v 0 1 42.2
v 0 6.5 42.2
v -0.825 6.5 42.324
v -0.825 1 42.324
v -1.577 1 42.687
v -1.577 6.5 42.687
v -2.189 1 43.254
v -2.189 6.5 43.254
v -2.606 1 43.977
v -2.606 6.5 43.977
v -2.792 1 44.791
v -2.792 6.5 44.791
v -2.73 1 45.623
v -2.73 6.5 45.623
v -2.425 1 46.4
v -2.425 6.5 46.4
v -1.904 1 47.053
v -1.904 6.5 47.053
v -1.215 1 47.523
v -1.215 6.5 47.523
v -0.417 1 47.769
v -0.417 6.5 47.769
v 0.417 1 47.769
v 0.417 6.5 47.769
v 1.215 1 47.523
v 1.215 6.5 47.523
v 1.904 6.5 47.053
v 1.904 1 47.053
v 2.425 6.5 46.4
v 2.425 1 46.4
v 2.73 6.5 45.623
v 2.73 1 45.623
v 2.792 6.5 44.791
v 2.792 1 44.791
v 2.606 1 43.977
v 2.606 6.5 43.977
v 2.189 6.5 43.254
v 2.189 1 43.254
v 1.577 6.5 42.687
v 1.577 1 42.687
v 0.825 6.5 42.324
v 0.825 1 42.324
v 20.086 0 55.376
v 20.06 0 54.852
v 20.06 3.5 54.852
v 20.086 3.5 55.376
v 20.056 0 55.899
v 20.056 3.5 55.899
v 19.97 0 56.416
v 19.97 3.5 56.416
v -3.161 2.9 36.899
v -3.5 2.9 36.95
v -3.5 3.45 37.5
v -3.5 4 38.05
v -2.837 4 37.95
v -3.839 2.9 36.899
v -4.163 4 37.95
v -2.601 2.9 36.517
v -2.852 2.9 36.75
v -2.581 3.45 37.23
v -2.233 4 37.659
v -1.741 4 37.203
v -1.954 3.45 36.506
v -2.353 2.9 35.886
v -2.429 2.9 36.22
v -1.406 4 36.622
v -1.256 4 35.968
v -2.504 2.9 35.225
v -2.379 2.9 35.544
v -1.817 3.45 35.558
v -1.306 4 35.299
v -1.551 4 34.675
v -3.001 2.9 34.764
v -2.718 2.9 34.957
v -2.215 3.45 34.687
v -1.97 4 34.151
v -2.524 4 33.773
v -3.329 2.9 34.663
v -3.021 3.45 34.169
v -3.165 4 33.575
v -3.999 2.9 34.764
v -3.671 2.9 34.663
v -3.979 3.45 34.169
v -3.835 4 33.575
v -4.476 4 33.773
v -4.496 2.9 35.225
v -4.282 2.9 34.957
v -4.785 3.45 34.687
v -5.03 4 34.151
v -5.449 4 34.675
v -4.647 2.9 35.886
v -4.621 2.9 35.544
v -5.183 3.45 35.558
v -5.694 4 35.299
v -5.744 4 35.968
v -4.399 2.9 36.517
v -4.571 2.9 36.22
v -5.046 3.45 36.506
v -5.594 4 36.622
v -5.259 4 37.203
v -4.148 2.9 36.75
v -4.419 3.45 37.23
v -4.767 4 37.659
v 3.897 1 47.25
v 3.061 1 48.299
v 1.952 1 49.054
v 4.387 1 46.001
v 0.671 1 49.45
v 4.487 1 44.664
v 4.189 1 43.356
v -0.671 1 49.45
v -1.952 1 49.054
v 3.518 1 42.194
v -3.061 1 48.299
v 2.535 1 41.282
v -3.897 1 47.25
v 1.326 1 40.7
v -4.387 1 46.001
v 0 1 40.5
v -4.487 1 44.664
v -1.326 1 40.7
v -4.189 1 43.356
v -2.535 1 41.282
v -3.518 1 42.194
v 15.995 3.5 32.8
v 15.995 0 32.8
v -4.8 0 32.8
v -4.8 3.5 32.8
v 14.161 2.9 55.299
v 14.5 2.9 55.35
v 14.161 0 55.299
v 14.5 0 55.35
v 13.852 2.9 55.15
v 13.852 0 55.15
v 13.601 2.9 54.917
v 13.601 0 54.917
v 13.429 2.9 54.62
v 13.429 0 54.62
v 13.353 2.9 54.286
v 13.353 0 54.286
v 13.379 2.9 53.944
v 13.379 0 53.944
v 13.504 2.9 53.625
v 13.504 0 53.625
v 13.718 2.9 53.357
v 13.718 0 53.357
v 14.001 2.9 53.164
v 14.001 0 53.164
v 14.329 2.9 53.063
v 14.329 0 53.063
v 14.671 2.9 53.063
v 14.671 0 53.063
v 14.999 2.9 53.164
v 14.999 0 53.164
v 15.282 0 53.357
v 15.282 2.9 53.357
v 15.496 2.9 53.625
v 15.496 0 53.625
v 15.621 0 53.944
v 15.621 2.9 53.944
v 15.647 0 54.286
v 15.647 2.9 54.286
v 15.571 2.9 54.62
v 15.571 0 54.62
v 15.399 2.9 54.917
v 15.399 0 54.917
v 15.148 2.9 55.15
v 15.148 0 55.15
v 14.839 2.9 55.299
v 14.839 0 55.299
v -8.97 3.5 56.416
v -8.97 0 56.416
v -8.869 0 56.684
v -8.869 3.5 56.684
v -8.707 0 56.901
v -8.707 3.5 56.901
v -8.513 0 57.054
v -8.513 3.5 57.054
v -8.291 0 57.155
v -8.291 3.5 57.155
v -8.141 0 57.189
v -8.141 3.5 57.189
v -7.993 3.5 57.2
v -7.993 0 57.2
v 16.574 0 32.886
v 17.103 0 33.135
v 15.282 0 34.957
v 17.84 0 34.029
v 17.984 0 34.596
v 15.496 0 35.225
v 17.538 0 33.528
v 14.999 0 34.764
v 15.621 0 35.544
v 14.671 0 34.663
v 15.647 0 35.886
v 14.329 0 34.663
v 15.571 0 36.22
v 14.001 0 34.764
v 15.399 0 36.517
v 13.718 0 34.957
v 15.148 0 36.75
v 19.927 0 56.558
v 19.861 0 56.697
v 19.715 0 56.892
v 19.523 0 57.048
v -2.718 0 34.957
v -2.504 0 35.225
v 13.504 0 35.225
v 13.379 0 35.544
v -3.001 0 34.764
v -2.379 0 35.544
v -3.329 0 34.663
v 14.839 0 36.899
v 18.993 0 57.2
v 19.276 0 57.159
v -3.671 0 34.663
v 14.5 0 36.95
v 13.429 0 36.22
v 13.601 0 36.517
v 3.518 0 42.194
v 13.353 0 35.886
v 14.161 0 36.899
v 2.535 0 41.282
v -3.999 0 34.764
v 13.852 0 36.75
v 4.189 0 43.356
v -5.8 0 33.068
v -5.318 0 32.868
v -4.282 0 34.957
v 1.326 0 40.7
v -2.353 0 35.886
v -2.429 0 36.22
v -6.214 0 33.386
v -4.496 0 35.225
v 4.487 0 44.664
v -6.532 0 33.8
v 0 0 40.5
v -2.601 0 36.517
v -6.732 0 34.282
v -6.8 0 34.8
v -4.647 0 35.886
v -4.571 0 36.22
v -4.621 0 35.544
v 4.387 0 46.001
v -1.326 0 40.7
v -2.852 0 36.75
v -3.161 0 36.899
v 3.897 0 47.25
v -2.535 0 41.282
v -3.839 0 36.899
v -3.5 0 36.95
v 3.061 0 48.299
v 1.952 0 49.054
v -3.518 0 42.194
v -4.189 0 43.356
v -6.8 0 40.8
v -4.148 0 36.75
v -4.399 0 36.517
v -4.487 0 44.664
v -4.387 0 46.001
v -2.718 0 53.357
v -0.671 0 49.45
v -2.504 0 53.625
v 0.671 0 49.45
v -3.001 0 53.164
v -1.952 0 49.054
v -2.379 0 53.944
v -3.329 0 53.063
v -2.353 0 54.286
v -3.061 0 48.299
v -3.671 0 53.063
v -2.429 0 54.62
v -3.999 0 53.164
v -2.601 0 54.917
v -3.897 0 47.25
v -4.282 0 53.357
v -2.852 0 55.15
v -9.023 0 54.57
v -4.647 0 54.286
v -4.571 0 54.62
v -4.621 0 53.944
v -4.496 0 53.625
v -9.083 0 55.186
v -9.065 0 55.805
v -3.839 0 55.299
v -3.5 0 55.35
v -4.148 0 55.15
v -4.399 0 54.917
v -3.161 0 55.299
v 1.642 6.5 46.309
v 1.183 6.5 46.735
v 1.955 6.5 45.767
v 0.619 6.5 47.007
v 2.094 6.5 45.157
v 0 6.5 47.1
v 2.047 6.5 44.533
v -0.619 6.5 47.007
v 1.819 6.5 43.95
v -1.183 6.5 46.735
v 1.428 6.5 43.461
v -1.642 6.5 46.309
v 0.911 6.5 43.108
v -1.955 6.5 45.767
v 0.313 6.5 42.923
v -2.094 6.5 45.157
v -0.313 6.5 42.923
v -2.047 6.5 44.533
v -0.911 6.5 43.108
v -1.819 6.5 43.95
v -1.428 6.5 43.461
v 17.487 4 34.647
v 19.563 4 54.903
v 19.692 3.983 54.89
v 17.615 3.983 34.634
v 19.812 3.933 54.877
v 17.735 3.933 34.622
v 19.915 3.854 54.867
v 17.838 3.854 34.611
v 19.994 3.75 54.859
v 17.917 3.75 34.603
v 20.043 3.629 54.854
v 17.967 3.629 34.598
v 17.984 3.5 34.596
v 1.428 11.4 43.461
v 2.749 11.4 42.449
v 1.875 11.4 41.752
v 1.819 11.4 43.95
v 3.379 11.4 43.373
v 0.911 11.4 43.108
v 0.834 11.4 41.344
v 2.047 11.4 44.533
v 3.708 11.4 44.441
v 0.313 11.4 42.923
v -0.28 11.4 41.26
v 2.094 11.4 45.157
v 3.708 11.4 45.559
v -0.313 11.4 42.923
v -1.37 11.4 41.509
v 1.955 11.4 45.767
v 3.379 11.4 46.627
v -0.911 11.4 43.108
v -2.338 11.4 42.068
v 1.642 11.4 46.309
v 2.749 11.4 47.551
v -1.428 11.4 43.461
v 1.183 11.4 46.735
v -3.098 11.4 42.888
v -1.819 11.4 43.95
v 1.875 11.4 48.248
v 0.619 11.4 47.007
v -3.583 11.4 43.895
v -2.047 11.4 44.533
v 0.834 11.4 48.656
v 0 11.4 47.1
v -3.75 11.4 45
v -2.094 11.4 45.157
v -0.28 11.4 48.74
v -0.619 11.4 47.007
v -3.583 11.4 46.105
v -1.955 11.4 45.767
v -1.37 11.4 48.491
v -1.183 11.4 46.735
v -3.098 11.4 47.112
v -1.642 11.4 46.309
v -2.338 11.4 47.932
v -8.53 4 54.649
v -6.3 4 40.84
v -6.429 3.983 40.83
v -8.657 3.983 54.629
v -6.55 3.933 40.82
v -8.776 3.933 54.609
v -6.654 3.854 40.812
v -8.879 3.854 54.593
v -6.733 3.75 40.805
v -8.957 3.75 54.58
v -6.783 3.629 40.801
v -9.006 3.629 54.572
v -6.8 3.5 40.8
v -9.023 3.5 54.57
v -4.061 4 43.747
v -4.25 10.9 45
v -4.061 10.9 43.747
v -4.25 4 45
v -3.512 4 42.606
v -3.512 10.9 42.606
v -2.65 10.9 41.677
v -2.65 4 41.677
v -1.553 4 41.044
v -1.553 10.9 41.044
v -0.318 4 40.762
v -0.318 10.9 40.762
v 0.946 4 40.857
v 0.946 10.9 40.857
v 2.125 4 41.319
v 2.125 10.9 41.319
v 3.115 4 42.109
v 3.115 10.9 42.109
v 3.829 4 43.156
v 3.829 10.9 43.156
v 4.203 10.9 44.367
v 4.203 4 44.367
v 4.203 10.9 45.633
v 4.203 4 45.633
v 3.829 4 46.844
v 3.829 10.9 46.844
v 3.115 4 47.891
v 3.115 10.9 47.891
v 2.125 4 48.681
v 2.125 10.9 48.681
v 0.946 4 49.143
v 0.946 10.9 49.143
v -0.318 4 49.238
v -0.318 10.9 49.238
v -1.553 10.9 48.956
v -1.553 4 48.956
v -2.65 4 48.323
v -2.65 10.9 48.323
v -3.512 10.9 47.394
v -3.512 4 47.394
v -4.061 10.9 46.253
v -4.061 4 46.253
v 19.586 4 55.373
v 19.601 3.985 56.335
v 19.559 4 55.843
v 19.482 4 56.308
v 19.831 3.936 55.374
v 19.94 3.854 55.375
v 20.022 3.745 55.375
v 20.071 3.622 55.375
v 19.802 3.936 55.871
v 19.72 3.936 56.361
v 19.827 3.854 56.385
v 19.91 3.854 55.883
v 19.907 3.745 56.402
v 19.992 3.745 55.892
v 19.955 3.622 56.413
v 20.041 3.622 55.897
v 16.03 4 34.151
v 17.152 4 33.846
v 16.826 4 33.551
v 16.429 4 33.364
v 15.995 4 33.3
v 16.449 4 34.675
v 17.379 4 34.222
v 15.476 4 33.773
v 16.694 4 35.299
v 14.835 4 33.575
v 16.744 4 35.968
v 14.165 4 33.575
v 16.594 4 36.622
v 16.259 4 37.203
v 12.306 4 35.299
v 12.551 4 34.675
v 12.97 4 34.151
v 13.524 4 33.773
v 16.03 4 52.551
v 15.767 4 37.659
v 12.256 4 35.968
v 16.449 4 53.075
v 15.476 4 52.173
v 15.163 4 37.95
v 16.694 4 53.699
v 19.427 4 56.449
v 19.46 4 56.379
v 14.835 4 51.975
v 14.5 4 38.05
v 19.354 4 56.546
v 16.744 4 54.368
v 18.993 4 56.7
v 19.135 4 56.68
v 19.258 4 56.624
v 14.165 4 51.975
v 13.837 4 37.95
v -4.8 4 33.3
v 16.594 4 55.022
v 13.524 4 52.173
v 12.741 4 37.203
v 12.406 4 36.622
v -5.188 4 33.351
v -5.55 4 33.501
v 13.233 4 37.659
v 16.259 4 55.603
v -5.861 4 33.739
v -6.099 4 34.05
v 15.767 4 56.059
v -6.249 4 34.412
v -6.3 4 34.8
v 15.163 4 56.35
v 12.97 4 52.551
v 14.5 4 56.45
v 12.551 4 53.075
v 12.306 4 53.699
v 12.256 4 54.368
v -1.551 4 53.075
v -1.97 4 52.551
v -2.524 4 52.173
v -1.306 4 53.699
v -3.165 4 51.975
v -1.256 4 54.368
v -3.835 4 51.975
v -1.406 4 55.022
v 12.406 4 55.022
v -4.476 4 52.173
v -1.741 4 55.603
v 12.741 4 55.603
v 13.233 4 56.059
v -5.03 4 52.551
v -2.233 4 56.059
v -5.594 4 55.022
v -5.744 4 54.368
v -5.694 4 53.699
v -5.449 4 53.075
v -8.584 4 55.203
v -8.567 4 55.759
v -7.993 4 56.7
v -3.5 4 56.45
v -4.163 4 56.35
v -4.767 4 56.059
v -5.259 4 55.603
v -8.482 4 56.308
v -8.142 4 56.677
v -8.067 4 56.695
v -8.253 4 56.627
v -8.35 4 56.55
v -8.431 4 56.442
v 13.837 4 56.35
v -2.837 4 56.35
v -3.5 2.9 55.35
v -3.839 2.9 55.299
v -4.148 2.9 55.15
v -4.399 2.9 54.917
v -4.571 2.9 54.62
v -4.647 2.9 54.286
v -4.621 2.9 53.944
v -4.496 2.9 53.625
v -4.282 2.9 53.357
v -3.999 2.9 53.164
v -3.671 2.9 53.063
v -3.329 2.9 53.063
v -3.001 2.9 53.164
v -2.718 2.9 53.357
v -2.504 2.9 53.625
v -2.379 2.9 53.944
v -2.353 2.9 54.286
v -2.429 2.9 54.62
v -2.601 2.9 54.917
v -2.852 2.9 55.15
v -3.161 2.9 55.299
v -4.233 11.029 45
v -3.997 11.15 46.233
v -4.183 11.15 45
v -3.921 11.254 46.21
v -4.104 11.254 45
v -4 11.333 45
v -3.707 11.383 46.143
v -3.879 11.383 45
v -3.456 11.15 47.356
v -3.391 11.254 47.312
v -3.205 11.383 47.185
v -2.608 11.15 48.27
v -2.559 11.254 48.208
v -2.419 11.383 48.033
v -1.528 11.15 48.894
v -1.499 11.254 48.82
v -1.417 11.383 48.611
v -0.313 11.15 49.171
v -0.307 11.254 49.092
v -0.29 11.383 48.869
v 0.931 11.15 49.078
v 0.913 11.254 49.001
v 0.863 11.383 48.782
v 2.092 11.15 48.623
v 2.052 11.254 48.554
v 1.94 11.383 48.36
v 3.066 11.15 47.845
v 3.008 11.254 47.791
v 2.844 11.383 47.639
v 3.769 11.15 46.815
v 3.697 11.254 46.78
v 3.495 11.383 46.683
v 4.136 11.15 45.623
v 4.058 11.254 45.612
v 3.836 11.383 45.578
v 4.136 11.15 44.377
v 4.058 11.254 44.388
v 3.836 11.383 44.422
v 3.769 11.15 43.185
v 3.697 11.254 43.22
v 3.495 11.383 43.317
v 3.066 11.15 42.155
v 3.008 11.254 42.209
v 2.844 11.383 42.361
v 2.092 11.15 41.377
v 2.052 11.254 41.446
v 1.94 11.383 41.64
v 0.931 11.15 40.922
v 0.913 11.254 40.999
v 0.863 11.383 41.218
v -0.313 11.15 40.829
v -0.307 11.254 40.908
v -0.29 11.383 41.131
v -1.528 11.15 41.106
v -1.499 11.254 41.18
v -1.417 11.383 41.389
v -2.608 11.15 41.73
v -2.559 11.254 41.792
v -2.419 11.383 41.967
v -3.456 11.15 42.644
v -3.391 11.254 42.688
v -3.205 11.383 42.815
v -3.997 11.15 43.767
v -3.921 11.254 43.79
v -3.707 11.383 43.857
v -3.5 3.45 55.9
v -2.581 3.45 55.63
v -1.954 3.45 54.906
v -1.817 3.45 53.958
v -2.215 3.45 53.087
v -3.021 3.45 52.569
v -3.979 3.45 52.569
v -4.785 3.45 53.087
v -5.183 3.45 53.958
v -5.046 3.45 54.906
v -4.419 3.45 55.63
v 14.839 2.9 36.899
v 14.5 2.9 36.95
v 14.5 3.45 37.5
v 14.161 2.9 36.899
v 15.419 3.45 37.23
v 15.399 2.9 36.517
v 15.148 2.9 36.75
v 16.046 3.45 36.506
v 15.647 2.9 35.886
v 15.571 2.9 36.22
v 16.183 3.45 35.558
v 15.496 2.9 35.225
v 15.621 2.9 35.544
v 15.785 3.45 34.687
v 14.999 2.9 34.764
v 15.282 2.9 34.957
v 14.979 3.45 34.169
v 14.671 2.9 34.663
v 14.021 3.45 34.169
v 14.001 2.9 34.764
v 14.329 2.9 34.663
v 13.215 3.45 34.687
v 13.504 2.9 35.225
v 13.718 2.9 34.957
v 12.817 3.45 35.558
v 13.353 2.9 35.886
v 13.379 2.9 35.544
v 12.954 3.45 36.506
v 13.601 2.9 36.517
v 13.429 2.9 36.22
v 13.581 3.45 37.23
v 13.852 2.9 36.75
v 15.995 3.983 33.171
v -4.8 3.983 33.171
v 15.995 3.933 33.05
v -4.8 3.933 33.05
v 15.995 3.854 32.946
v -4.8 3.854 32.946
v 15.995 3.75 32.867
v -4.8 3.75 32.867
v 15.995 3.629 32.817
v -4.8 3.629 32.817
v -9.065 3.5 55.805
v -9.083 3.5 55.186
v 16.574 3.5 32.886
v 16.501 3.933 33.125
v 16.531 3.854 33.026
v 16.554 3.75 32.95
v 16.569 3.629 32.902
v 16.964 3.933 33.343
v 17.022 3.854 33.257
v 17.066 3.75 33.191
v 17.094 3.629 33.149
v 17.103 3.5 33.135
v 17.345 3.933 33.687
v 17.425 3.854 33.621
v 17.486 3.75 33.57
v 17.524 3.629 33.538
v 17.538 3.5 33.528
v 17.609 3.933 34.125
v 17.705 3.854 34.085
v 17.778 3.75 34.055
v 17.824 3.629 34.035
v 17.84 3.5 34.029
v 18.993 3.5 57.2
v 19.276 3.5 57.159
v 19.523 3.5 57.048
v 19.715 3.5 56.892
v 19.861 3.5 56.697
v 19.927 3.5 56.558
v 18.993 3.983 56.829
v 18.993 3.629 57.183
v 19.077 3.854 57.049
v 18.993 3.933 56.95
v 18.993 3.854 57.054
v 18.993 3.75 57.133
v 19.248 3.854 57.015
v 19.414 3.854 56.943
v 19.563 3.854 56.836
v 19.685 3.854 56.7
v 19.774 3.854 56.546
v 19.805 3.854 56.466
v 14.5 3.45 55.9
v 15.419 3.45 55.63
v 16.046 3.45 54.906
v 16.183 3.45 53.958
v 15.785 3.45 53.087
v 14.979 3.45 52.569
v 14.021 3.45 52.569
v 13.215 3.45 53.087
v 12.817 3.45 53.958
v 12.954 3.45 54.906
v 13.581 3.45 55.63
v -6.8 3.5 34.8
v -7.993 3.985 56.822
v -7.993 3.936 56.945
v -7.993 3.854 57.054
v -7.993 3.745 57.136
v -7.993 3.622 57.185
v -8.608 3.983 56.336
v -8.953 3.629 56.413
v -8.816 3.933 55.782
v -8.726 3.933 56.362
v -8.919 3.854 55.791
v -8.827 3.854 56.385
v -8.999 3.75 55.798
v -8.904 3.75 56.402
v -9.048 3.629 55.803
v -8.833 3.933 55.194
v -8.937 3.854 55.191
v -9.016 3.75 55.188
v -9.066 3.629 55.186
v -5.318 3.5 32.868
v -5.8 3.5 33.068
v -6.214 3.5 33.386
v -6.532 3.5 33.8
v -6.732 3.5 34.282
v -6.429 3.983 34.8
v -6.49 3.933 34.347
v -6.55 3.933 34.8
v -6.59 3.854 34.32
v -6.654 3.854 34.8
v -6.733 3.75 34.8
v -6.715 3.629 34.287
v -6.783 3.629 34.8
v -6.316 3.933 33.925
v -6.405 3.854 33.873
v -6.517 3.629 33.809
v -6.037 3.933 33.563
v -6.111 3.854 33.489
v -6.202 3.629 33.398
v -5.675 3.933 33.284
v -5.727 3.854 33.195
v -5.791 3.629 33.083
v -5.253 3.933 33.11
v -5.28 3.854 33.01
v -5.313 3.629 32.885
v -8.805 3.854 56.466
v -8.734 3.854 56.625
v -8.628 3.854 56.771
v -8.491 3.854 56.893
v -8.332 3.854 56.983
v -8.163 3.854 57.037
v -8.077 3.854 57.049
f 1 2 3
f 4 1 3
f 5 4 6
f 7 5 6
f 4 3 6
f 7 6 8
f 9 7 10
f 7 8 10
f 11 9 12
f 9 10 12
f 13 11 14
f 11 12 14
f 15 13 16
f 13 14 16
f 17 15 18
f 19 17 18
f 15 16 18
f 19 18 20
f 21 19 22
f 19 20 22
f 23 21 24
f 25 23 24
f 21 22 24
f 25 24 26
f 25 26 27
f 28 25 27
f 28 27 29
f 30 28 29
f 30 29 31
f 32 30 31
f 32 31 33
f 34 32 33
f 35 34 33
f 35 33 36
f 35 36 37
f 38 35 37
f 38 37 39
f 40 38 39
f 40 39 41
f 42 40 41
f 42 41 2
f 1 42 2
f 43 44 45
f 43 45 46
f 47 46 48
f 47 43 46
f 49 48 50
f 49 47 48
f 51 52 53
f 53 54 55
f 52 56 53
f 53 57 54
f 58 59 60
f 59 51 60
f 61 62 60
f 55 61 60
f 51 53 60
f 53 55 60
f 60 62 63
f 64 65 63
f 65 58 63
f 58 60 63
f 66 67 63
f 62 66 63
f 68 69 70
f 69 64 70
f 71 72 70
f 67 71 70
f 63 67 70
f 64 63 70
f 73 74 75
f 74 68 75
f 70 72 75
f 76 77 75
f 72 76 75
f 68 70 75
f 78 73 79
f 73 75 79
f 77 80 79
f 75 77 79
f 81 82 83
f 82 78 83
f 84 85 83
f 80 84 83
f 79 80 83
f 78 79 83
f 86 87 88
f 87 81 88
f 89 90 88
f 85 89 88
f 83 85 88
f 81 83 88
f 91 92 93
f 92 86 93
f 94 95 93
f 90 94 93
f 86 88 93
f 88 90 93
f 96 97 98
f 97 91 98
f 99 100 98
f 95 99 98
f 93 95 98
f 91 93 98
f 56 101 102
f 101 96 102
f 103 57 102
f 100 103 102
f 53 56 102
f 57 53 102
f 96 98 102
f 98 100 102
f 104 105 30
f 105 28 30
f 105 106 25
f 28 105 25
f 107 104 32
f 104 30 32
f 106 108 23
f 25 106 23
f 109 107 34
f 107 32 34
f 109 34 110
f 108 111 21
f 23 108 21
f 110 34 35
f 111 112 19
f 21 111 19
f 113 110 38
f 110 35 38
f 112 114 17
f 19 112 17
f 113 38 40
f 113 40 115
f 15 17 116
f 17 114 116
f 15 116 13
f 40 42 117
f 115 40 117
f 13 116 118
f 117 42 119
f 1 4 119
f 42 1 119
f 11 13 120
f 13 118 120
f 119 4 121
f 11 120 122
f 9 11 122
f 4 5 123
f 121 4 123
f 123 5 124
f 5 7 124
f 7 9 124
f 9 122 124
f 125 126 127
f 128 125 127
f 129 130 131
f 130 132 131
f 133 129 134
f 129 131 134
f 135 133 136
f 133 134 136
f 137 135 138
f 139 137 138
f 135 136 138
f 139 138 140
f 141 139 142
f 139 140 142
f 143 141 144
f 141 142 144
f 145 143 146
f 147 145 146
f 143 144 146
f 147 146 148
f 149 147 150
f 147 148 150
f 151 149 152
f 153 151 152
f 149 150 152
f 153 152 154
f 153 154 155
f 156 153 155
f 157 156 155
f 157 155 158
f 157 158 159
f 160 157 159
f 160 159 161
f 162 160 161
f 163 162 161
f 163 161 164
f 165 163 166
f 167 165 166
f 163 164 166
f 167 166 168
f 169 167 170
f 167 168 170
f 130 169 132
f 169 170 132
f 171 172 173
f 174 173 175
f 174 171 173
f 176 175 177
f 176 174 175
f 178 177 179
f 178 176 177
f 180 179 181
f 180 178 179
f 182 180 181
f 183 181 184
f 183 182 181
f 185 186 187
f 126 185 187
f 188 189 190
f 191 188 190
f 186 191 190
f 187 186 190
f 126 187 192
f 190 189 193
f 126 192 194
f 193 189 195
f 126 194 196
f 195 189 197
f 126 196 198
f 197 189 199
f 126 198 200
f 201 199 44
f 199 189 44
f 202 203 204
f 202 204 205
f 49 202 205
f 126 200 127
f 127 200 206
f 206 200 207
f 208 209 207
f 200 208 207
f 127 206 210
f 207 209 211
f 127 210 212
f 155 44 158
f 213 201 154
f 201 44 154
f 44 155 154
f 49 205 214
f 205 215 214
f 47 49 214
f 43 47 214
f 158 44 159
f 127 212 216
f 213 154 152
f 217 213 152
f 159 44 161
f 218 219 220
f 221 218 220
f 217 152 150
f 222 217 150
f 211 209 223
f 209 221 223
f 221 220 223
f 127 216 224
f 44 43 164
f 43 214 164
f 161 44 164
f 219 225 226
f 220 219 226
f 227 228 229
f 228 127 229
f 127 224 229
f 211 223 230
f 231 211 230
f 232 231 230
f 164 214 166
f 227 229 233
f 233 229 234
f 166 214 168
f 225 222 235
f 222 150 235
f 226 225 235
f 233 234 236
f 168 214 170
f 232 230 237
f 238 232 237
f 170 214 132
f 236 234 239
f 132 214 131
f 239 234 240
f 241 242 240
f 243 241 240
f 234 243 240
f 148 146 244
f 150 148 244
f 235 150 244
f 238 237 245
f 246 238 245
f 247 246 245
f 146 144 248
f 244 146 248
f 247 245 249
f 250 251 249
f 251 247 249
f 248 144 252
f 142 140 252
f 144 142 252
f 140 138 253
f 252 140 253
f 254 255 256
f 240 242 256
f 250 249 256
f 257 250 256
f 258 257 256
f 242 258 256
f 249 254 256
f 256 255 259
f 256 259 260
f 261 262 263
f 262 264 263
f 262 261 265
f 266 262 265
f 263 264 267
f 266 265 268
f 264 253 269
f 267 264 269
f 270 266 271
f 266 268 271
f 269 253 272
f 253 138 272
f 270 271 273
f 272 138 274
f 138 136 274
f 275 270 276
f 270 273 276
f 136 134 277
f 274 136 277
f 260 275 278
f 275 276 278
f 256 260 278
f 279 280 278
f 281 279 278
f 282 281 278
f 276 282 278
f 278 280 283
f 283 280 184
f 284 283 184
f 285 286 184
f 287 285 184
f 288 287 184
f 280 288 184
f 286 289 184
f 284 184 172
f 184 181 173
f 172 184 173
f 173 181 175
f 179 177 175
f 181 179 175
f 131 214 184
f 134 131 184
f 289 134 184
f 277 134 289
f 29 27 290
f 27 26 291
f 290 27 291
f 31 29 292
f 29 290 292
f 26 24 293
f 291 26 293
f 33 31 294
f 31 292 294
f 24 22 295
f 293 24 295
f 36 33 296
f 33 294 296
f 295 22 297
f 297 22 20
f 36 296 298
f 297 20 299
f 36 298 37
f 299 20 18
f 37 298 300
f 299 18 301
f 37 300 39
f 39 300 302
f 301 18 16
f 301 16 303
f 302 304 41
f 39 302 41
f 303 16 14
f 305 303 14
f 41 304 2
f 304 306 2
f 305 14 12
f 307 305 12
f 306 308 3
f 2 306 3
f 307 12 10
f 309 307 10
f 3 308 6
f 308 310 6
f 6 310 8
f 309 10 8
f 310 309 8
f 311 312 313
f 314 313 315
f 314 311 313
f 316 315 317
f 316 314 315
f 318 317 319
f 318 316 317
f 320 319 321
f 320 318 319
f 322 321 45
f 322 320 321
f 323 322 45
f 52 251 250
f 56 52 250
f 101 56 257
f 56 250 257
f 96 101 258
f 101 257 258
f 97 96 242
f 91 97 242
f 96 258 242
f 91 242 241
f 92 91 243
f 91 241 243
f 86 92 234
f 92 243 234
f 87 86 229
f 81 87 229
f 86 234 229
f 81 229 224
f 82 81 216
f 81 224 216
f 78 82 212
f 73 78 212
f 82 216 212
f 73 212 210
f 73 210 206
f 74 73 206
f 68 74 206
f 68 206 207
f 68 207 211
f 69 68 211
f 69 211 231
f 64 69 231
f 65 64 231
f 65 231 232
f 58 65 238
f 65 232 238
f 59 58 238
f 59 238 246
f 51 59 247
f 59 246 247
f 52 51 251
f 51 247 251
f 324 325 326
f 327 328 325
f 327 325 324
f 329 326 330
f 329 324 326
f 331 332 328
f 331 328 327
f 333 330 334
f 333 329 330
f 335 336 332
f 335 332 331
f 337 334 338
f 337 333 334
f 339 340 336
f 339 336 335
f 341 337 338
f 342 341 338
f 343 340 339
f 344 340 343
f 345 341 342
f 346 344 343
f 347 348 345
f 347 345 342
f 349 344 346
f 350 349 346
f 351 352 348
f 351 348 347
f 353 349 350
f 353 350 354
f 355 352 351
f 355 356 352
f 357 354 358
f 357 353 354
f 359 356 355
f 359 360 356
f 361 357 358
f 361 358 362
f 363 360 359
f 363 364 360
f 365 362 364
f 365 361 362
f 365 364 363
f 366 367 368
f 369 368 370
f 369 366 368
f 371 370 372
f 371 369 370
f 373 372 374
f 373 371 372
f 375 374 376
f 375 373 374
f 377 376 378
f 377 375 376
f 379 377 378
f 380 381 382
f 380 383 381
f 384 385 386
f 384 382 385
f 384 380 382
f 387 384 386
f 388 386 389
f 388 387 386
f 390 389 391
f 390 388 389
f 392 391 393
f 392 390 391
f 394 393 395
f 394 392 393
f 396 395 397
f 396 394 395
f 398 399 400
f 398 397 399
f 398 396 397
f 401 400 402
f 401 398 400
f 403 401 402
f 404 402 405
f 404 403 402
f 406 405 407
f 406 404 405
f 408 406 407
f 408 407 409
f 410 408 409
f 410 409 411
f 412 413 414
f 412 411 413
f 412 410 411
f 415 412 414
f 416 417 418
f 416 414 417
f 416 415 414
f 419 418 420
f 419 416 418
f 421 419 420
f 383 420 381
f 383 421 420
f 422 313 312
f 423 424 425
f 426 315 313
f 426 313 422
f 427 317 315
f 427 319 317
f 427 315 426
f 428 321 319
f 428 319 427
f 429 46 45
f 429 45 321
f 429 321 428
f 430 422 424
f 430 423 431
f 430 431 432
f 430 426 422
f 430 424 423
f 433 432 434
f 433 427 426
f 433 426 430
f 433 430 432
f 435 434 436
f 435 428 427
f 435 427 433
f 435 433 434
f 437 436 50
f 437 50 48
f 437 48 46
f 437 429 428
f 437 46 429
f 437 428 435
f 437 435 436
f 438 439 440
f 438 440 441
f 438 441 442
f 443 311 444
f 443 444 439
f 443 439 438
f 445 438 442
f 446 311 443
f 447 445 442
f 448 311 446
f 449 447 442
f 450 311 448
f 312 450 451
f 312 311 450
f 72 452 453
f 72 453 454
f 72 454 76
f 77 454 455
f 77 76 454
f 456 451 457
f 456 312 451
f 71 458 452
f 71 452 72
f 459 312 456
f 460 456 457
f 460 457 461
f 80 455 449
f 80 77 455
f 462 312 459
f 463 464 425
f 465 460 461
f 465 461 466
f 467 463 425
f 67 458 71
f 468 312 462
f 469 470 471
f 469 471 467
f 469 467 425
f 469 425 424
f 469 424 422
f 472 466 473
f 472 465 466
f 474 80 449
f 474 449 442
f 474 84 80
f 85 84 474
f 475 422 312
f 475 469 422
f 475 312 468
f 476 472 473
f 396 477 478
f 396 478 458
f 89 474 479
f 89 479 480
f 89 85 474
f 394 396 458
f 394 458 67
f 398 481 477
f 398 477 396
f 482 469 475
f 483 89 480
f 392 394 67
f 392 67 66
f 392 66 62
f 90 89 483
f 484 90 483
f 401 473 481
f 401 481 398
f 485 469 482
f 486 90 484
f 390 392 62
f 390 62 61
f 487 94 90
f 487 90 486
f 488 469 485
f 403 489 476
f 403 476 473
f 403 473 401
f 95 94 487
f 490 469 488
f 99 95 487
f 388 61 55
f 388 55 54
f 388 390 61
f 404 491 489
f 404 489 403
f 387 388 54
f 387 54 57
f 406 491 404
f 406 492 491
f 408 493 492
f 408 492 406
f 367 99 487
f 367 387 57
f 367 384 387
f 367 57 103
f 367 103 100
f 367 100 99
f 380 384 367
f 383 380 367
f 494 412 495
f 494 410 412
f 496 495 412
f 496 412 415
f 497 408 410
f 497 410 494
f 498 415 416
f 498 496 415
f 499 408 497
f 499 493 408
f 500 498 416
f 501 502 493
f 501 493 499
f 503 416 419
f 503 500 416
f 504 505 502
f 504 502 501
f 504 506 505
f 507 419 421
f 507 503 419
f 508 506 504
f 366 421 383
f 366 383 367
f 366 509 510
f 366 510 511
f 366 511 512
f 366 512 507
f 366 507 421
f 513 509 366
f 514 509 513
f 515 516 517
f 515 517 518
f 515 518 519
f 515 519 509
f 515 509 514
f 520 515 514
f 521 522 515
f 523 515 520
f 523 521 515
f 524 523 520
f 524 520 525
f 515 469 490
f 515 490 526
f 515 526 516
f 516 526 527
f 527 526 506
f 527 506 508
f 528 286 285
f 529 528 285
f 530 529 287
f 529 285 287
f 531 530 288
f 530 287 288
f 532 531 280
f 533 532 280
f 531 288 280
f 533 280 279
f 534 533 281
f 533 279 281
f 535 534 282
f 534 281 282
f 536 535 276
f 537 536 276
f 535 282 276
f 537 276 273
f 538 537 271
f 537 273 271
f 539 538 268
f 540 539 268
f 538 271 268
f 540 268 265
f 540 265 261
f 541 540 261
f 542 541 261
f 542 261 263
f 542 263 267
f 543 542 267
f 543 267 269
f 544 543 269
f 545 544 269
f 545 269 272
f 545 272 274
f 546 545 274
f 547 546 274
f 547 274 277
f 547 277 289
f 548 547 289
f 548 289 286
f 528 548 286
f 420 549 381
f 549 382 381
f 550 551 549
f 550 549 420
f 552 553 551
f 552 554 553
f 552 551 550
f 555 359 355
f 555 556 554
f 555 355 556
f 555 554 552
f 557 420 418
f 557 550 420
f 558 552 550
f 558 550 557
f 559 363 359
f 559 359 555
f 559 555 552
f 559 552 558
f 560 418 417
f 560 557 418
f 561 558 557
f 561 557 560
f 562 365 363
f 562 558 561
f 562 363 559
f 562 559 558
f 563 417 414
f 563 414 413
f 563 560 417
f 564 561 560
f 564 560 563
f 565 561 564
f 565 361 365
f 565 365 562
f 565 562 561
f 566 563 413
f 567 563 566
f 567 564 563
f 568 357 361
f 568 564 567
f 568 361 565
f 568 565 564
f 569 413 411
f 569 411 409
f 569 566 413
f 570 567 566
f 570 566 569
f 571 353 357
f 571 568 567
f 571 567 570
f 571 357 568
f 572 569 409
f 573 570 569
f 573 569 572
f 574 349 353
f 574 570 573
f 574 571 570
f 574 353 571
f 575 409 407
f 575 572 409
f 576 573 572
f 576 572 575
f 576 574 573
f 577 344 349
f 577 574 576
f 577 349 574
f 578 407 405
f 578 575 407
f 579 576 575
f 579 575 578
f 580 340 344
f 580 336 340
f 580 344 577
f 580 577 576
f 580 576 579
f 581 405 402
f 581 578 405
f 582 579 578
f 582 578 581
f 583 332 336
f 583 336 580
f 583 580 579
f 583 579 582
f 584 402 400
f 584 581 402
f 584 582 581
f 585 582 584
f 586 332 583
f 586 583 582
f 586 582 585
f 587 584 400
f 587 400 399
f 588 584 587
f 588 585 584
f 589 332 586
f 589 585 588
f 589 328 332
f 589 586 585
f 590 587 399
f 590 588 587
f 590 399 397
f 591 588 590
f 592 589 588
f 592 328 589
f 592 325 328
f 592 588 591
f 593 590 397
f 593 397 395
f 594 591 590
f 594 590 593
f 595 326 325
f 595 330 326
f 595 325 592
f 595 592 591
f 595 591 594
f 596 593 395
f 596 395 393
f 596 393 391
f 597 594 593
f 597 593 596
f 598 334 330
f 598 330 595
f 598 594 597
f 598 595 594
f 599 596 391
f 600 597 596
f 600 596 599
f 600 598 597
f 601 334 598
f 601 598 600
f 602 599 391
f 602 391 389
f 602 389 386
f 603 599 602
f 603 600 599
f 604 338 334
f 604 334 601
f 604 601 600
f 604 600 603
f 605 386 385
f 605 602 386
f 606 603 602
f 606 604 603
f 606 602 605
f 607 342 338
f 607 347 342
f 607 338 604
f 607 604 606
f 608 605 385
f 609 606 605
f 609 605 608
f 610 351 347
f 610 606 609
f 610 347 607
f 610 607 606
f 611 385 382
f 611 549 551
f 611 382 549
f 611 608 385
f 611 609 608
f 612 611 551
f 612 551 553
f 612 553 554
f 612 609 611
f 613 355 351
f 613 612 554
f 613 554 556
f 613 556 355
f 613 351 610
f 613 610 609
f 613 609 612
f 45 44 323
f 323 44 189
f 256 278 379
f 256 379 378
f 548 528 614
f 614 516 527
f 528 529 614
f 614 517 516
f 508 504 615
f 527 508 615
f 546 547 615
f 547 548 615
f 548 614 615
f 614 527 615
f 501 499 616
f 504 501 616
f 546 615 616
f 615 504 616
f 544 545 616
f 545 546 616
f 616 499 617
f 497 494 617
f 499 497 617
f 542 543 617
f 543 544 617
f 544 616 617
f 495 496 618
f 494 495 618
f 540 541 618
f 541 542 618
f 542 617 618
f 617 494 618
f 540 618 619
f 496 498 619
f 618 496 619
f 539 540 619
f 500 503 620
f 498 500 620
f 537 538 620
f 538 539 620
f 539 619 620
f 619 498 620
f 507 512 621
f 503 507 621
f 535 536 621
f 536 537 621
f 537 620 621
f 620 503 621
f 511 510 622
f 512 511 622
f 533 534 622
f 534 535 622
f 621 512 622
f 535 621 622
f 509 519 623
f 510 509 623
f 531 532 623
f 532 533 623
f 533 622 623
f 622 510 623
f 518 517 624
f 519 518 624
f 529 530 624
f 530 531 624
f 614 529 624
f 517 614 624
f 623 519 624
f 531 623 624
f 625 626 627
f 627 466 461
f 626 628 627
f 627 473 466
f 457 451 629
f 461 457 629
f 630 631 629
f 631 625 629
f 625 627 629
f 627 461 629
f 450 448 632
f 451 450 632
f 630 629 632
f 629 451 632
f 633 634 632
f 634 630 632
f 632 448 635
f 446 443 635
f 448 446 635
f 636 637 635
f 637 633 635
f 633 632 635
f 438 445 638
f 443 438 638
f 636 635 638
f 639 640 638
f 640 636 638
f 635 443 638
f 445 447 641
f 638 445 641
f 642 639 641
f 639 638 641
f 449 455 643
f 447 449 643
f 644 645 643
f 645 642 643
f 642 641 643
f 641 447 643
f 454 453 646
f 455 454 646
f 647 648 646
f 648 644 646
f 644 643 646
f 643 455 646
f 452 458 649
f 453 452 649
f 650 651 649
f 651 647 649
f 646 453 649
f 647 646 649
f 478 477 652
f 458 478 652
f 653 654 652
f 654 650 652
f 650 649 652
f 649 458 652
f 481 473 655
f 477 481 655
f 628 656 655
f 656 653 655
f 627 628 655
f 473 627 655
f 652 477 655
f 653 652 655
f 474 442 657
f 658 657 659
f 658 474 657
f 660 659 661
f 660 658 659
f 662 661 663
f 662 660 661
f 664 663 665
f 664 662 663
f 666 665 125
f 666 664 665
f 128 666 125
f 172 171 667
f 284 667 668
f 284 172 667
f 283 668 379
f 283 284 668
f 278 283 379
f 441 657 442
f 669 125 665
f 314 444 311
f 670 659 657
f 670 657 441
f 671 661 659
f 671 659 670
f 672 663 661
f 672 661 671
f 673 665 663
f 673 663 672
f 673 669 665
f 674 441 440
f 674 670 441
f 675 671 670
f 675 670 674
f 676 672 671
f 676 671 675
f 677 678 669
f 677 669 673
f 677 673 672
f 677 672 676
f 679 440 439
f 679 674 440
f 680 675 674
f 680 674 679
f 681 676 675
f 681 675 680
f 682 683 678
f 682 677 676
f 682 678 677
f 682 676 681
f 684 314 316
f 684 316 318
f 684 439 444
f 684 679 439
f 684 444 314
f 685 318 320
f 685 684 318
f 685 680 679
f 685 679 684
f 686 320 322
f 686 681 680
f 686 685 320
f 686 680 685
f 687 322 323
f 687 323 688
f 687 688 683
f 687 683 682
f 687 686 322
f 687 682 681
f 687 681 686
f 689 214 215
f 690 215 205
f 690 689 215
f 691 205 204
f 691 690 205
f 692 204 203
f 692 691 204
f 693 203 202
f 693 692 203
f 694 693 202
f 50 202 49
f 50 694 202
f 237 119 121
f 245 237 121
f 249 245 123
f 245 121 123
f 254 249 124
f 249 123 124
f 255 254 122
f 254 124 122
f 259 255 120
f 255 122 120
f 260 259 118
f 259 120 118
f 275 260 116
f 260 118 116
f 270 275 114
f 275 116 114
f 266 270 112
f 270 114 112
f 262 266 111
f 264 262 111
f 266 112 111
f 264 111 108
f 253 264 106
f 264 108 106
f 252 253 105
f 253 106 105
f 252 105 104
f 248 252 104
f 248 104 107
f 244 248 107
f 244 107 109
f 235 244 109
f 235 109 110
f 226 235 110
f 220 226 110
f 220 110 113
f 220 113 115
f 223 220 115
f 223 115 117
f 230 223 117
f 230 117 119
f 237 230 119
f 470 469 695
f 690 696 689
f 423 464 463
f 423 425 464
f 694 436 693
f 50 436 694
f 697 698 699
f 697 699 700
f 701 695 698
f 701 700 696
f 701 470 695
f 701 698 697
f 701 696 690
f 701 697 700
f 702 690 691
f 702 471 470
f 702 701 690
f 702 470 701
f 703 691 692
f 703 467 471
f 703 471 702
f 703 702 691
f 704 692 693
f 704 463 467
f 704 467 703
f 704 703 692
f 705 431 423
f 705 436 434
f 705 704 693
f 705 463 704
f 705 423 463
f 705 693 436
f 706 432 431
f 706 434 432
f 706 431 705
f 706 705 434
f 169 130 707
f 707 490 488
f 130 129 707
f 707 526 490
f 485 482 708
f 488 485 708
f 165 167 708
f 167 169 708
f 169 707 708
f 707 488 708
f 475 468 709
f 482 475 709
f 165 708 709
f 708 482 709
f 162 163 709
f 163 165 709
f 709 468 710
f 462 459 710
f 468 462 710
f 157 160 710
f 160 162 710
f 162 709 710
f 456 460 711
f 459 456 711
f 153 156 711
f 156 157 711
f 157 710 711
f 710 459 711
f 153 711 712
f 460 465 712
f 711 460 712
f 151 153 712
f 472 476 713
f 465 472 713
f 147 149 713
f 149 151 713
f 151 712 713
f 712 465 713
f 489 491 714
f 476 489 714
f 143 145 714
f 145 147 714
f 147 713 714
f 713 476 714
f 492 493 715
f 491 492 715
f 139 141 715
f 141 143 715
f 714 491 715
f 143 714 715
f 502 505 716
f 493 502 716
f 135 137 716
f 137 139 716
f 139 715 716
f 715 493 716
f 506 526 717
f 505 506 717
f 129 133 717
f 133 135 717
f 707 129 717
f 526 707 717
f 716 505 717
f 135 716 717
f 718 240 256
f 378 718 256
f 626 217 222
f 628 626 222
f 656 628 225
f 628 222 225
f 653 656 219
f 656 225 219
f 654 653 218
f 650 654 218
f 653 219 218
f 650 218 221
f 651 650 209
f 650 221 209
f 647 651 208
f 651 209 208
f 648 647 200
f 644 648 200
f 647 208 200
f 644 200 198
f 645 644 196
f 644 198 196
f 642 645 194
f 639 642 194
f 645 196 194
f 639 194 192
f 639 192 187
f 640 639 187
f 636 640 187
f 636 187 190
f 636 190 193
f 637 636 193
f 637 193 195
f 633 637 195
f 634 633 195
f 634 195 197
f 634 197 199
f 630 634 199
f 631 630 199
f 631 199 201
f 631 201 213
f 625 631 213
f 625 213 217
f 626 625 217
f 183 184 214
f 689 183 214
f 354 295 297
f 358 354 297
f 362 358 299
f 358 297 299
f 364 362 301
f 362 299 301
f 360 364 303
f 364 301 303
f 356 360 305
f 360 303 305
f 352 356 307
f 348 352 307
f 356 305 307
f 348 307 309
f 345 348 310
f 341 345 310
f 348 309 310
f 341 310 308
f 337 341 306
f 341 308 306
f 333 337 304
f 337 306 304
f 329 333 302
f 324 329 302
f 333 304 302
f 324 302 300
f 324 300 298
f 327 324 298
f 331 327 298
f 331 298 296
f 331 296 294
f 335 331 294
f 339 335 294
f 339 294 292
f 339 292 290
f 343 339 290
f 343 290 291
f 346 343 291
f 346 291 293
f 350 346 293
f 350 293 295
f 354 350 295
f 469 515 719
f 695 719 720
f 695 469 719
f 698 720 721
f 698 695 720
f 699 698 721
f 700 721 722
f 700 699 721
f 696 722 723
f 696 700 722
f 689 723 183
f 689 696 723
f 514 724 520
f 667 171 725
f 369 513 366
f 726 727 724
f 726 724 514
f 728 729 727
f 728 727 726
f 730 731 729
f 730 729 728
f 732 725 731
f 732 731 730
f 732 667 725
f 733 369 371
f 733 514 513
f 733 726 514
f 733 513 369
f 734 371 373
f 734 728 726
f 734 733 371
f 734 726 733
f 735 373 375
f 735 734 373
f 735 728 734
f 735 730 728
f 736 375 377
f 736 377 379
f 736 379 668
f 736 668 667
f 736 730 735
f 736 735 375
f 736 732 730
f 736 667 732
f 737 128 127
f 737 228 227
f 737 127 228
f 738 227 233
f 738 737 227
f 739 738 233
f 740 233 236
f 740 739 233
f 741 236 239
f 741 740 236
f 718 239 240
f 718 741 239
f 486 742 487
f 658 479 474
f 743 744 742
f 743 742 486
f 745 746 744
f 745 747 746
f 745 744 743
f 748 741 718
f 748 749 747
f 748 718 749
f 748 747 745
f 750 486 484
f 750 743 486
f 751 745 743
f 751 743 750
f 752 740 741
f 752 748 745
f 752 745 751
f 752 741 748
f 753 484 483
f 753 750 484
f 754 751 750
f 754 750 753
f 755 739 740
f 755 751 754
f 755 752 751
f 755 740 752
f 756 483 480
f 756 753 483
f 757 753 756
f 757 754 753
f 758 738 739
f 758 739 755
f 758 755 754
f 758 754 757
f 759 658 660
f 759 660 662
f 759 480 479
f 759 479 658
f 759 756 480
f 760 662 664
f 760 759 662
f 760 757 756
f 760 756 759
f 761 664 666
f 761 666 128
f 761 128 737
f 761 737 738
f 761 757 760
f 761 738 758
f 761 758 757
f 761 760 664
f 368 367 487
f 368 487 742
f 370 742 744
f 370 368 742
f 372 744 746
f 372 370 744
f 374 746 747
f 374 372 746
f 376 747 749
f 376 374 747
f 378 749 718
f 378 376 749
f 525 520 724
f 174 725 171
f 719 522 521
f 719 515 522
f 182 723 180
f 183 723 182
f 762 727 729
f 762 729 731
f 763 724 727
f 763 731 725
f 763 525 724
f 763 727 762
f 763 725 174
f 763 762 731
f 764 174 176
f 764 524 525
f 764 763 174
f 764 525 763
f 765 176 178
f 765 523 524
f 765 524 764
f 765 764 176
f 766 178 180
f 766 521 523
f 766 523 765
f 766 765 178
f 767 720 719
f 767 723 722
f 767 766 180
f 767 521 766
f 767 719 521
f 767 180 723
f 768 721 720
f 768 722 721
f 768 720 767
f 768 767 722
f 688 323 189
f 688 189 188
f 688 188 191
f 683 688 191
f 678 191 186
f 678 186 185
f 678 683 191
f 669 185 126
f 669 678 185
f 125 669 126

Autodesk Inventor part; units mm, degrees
ref_plane "YZ Plane" through (0, 0, 0) normal (1, 0, 0) x (0, 1, 0)
ref_plane "XZ Plane" through (0, 0, 0) normal (0, 1, 0) x (-1, 0, 0)
ref_plane "XY Plane" through (0, 0, 0) normal (0, 0, 1) x (1, 0, 0)
sketch "Sketch1" plane through (0, 0, 0) normal (0, 1, 0) x (-1, 0, 0)
  line L0 (0, 114.579) -> (0, -115.31) construction
  line L1 (119.896, 0) -> (-136.2997, 0) construction
  line L2 (65, 45) -> (31.9074, 45) construction
  line L3 (-65, 45) -> (-65, 11.9074) construction
  line L4 (-65, -45) -> (-19.7, -45) construction
  line L5 (65, -45) -> (65, -11.9074) construction
  line L6 (64.9671, -36.1989) -> (82.3619, -53.5938) construction
  line L7 (82.3619, -53.5938) -> (73.5938, -62.3619) construction
  line L8 (73.5938, -62.3619) -> (56.1989, -44.9671) construction
  line L9 (56.1989, -44.9671) -> (64.9671, -36.1989) construction
  line L10 (64.9671, 36.1989) -> (82.3619, 53.5938) construction
  line L11 (82.3619, 53.5938) -> (73.5938, 62.3619) construction
  line L12 (73.5938, 62.3619) -> (56.1989, 44.9671) construction
  line L13 (56.1989, 44.9671) -> (64.9671, 36.1989) construction
  line L14 (-56.1989, 44.9671) -> (-73.5938, 62.3619) construction
  line L15 (-73.5938, 62.3619) -> (-82.3619, 53.5938) construction
  line L16 (-82.3619, 53.5938) -> (-64.9671, 36.1989) construction
  line L17 (-64.9671, 36.1989) -> (-56.1989, 44.9671) construction
  line L18 (-56.1989, -44.9671) -> (-73.5938, -62.3619) construction
  line L19 (-73.5938, -62.3619) -> (-82.3619, -53.5938) construction
  line L20 (-82.3619, -53.5938) -> (-64.9671, -36.1989) construction
  line L21 (-64.9671, -36.1989) -> (-56.1989, -44.9671) construction
  line L22 (55, 30) -> (-15, 30) construction
  line L23 (-15, 30) -> (-15, -30) construction
  line L24 (-15, -30) -> (55, -30) construction
  line L25 (55, -30) -> (55, 30) construction
  line L26 (73.6645, 44.8963) -> (64.8963, 53.6645) construction
  line L27 (68.7854, 57.5536) -> (77.5536, 48.7854) construction
  circle A0 centre (73.1695, 53.1695) radius 4.25 construction
  line L28 (73.6645, -44.8963) -> (64.8963, -53.6645) construction
  line L29 (77.5536, -48.7854) -> (68.7854, -57.5536) construction
  circle A1 centre (73.1695, -53.1695) radius 4.25 construction
  line L30 (-64.8963, 53.6645) -> (-73.6645, 44.8963) construction
  line L31 (-68.7854, 57.5536) -> (-77.5536, 48.7854) construction
  circle A2 centre (-73.1695, 53.1695) radius 4.25 construction
  line L32 (-73.6645, -44.8963) -> (-64.8963, -53.6645) construction
  line L33 (-77.5536, -48.7854) -> (-68.7854, -57.5536) construction
  circle A3 centre (-73.1695, -53.1695) radius 4.25 construction
  line L34 (6.8, 51.2) -> (-17.8, 51.2)
  line L35 (-17.8, 51.2) -> (-17.8, 38.8)
  line L36 (-17.8, 38.8) -> (6.8, 38.8)
  line L37 (6.8, 38.8) -> (6.8, 51.2)
  line L38 (6.8, -38.8) -> (-17.8, -38.8) construction
  line L39 (-17.8, -38.8) -> (-17.8, -51.2) construction
  line L40 (-17.8, -51.2) -> (6.8, -51.2) construction
  line L41 (6.8, -51.2) -> (6.8, -38.8) construction
  line L42 (6.8, 45) -> (-17.8, 45) construction
  line L43 (-5.5, 51.2) -> (-5.5, 38.8) construction
  line L44 (0, 51.2) -> (0, 38.8) construction
  line L45 (6.8, -45) -> (-17.8, -45) construction
  line L46 (-5.5, -38.8) -> (-5.5, -51.2) construction
  line L47 (0, -38.8) -> (0, -51.2) construction
  circle A4 centre (0, 45) radius 4.25
  circle A5 centre (0, -45) radius 4.25 construction
  line L48 (20, 30) -> (20, -30) construction
  line L49 (8.8, 57.2) -> (-19.8, 57.2)
  line L50 (8.8, -57.2) -> (-19.8, -57.2) construction
  line L51 (8.8, 57.2) -> (8.8, 45) construction
  line L52 (-19.8, 57.2) -> (-19.8, 45) construction
  line L53 (8.8, -57.2) -> (8.8, -45) construction
  line L54 (-19.8, -57.2) -> (-19.8, -45) construction
  line L55 (67.2298, 63.069) -> (61.3608, 57.2) construction
  line L56 (83.069, 47.2298) -> (77.2, 41.3608) construction
  line L57 (64.8963, 53.6645) -> (61.3608, 57.2) construction
  line L58 (73.6645, 44.8963) -> (77.2, 41.3608) construction
  arc A6 (83.069, 47.2298) -> (67.2298, 63.069) centre (75.1494, 55.1494) ccw construction
  line L59 (-61.3608, 57.2) -> (-67.2298, 63.069) construction
  line L60 (-83.069, 47.2298) -> (-77.2, 41.3608) construction
  line L61 (-61.3608, 57.2) -> (-64.8963, 53.6645) construction
  line L62 (-77.2, 41.3608) -> (-73.6645, 44.8963) construction
  arc A7 (-67.2298, 63.069) -> (-83.069, 47.2298) centre (-75.1494, 55.1494) ccw construction
  line L63 (73.6645, -44.8963) -> (77.2, -41.3608) construction
  line L64 (77.2, -41.3608) -> (83.069, -47.2298) construction
  line L65 (64.8963, -53.6645) -> (61.3608, -57.2) construction
  line L66 (61.3608, -57.2) -> (67.2298, -63.069) construction
  arc A8 (67.2298, -63.069) -> (83.069, -47.2298) centre (75.1494, -55.1494) ccw construction
  line L67 (-73.6645, -44.8963) -> (-77.2, -41.3608) construction
  line L68 (-64.8963, -53.6645) -> (-61.3608, -57.2) construction
  line L69 (-61.3608, -57.2) -> (-67.2298, -63.069) construction
  line L70 (-77.2, -41.3608) -> (-83.069, -47.2298) construction
  arc A9 (-83.069, -47.2298) -> (-67.2298, -63.069) centre (-75.1494, -55.1494) ccw construction
  arc A10 (23.5363, -45) -> (8.8, -57.2) centre (23.5363, -60) ccw construction
  arc A11 (61.3608, -57.2) -> (31.9074, -45) centre (31.9074, -86.6534) ccw construction
  arc A12 (65, -11.9074) -> (77.2, -41.3608) centre (106.6534, -11.9074) ccw construction
  arc A13 (77.2, 41.3608) -> (65, 11.9074) centre (106.6534, 11.9074) ccw construction
  arc A14 (31.9074, 45) -> (61.3608, 57.2) centre (31.9074, 86.6534) ccw construction
  arc A15 (8.8, 57.2) -> (23.5363, 45) centre (23.5363, 60) ccw
  arc A16 (-65, 11.9074) -> (-77.2, 41.3608) centre (-106.6534, 11.9074) ccw construction
  arc A17 (-77.2, -41.3608) -> (-65, -11.9074) centre (-106.6534, -11.9074) ccw construction
  line L71 (73.1695, -53.1695) -> (-73.1695, -53.1695) construction
  line L72 (-73.1695, 53.1695) -> (73.1695, 53.1695) construction
  line L73 (-61.3608, 57.2) -> (-61.3608, 45) construction
  line L74 (-61.3608, -57.2) -> (-61.3608, -45) construction
  arc A18 (-19.8, -57.2) -> (-34.5363, -45) centre (-34.5363, -60) ccw construction
  arc A19 (-31.9074, -45) -> (-61.3608, -57.2) centre (-31.9074, -86.6534) ccw construction
  arc A20 (-34.5363, 45) -> (-33.5506, 45.0324) centre (-34.5363, 60) ccw
  arc A21 (-61.3608, 57.2) -> (-33.5506, 45.0324) centre (-31.9074, 86.6534) ccw construction
  line L75 (73.5938, 62.3619) -> (76.4222, 65.1903) construction
  line L76 (76.4222, 65.1903) -> (85.1903, 56.4222) construction
  line L77 (85.1903, 56.4222) -> (82.3619, 53.5938) construction
  line L78 (79.3213, 59.3213) -> (59.2395, 39.2395) construction
  line L79 (59.2395, -39.2395) -> (79.3213, -59.3213) construction
  line L80 (-79.3213, 59.3213) -> (-59.2395, 39.2395) construction
  line L81 (-79.3213, -59.3213) -> (-59.2395, -39.2395) construction
  line L82 (75.1494, 55.1494) -> (77.9778, 57.9778) construction
  line L83 (75.1494, -55.1494) -> (77.9778, -57.9778) construction
  line L84 (-75.1494, -55.1494) -> (-77.9778, -57.9778) construction
  line L85 (-75.1494, 55.1494) -> (-77.9778, 57.9778) construction
  line L86 (-19.7, 45) -> (-65, 45) construction
  line L87 (8.7, 45) -> (-19.7, 45) construction
  line L88 (8.7, -45) -> (23.5363, -45) construction
  line L89 (-19.7, -45) -> (8.7, -45) construction
  line L90 (82.3619, 53.5938) -> (85.3751, 50.5805) construction
  line L91 (73.5938, 62.3619) -> (70.5805, 65.3751) construction
  line L92 (80.1698, 55.7858) -> (75.3615, 50.9775) construction
  line L93 (70.9775, -55.3615) -> (75.7858, -60.1698) construction
  line L94 (0, -48.1) -> (6.8, -48.1) construction
  line L95 (-75.3615, -50.9775) -> (-80.1698, -55.7858) construction
  line L96 (-75.7858, 60.1698) -> (-70.9775, 55.3615) construction
  line L97 (0, 48.1) -> (6.8, 48.1) construction
  line L98 (82.3619, -53.5938) -> (85.3751, -50.5805) construction
  line L99 (73.5938, -62.3619) -> (70.5805, -65.3751) construction
  line L100 (-73.5938, -62.3619) -> (-70.5805, -65.3751) construction
  line L101 (-82.3619, -53.5938) -> (-85.3751, -50.5805) construction
  line L102 (-73.5938, 62.3619) -> (-70.5805, 65.3751) construction
  line L103 (-82.3619, 53.5938) -> (-85.3751, 50.5805) construction
  line L104 (31.9074, 45) -> (23.5363, 45) construction
  line L105 (23.5363, 45) -> (8.7, 45) construction
  arc A22 (-33.5506, 45.0324) -> (-31.9074, 45) centre (-31.9074, 86.6534) ccw
  arc A23 (-33.5506, 45.0324) -> (-19.8, 57.2) centre (-34.5363, 60) ccw
  line L106 (-21.9995, 42) -> (-51.9995, 42) construction
  line L107 (-51.9995, 42) -> (-51.9995, -42) construction
  line L108 (-51.9995, -42) -> (-21.9995, -42) construction
  line L109 (-21.9995, -42) -> (-21.9995, 42) construction
  line L110 (52, 27) -> (55, 27) construction
  line L111 (52, -27) -> (55, -27) construction
  line L112 (52, 27) -> (52, 30) construction
  line L113 (-12, 27) -> (-12, 30) construction
  line L114 (-12, 27) -> (-15, 27) construction
  line L115 (-15, -27) -> (-12, -27) construction
  line L116 (-12, -27) -> (-12, -30) construction
  line L117 (52, -27) -> (52, -30) construction
  line L118 (-19.4995, 10) -> (-20.9995, 10) construction
  line L119 (-20.9995, 10) -> (-20.9995, -10) construction
  line L120 (-20.9995, -10) -> (-19.4995, -10) construction
  line L121 (-19.4995, -10) -> (-19.4995, 10) construction
  line L122 (-19.4995, 0) -> (-20.9995, 0) construction
  line L123 (-36.9995, 42) -> (-36.9995, -42) construction
  line L124 (-52.9995, 10) -> (-54.4995, 10) construction
  line L125 (-54.4995, 10) -> (-54.4995, -10) construction
  line L126 (-54.4995, -10) -> (-52.9995, -10) construction
  line L127 (-52.9995, -10) -> (-52.9995, 10) construction
  line L128 (-52.9995, 0) -> (-54.4995, 0) construction
  line L129 (31.9074, -45) -> (65, -45) construction
  line L130 (23.5363, -45) -> (31.9074, -45) construction
  line L131 (65, -11.9074) -> (65, 11.9074) construction
  line L132 (65, 11.9074) -> (65, 45) construction
  arc A24 (68.1707, 27.8475) -> (64.9671, 36.1989) centre (57.1958, 28.4277) ccw construction
  arc A25 (56.1989, 44.9671) -> (47.8475, 48.1707) centre (48.4277, 37.1958) ccw construction
  arc A26 (64.9671, -36.1989) -> (68.1707, -27.8475) centre (57.1958, -28.4277) ccw construction
  arc A27 (47.8475, -48.1707) -> (56.1989, -44.9671) centre (48.4277, -37.1958) ccw construction
  arc A28 (-56.1989, -44.9671) -> (-47.8475, -48.1707) centre (-48.4277, -37.1958) ccw construction
  arc A29 (-68.1707, -27.8475) -> (-64.9671, -36.1989) centre (-57.1958, -28.4277) ccw construction
  arc A30 (-48.6036, 48.4926) -> (-56.1989, 44.9671) centre (-47.5843, 36.3524) ccw construction
  arc A31 (-64.9671, 36.1989) -> (-68.1707, 27.8475) centre (-57.1958, 28.4277) ccw construction
  line L133 (-65, 11.9074) -> (-65, -11.9074) construction
  line L134 (-65, -11.9074) -> (-65, -45) construction
  line L135 (-56.1989, 44.9671) -> (-56.1989, -44.9671) construction
  arc A32 (-19.9504, 56.5) -> (-17.8, 51.2) centre (-15.1706, 55.3531) ccw
  arc A33 (6.8, 51.2) -> (8.9504, 56.5) centre (4.1706, 55.3531) ccw
  arc A34 (8.9504, -56.5) -> (6.8, -51.2) centre (4.1706, -55.3531) ccw construction
  arc A35 (-17.8, -51.2) -> (-19.9504, -56.5) centre (-15.1706, -55.3531) ccw construction
  line L136 (-17.8, 38.8) -> (-17.8, 32.8)
  line L137 (-17.8, 32.8) -> (6.8, 32.8)
  line L138 (6.8, 32.8) -> (6.8, 38.8)
  line L139 (-17.8, -38.8) -> (-17.8, -32.8) construction
  line L140 (-17.8, -32.8) -> (6.8, -32.8) construction
  line L141 (6.8, -32.8) -> (6.8, -38.8) construction
  line L142 (3.5, 54.2) -> (3.5, 35.8) construction
  line L143 (3.5, 35.8) -> (-14.5, 35.8) construction
  line L144 (-14.5, 35.8) -> (-14.5, 54.2) construction
  line L145 (-14.5, 54.2) -> (3.5, 54.2) construction
  line L146 (9.0232, 54.5696) -> (6.8, 40.8)
  line L147 (-20.0605, 54.8518) -> (-17.8, 32.8)
  point P0 (0, 0)
  point P1 (64.9853, 0)
  point P2 (55, 0)
  point P3 (60.583, -40.583)
  point P4 (-59.2395, 39.2395)
  point P5 (-60.583, 40.583)
  point P6 (-60.583, -40.583)
  point P7 (0, 45)
  point P8 (-33.9298, 45.0048)
  point P9 (-33.5506, -45.0324)
  point P10 (-56.1658, -45)
  point P11 (-56.2319, -45)
  point P12 (-56.2319, 45)
  point P13 (-56.1659, 45)
  point P14 (-20.0537, 54.7901)
  point P15 (6.8, 33.8)
  dimension "d0" = 135
  dimension "d4" = 24.6
  dimension "d5" = 12.4
  dimension "d6" = 70
  dimension "d7" = 60
  dimension "d9" = 8.5
  dimension "d10" = 135
  dimension "d12" = 6
  dimension "d13" = 2
  dimension "d14" = 2
  dimension "d16" = 20
  dimension "d23" = 5
  dimension "d29" = 130
  dimension "d32" = 15
  dimension "d33" = 4
  dimension "d34" = 28.4
  dimension "d38" = 4
  dimension "d40" = 6.8
  dimension "d49" = 30
  dimension "d50" = 84
  dimension "d51" = 3
  dimension "d52" = 3
  dimension "d53" = 1.5
  dimension "d54" = 20
  dimension "d59" = 1
  dimension "d60" = 90
  dimension "d61" = 135
  dimension "d70" = 135
  dimension "d82" = 0.7
  dimension "d83" = 0.7
  dimension "d84" = 0.7
  dimension "d85" = 0.7
  dimension "d86" = 6
  dimension "d102" = 18
  dimension "d126" = 2
extrude "Extrusion12" add sketch "Sketch1" along normal blind 4 contours A33 L146 L37 | L34 A32 A23 L49 A15 A33 | L35 L136 L147 A32 | L36 L138 L137 L136
extrude "Extrusion13" add sketch "Sketch1" along normal blind 4 contours L37 L36 L35 L34
extrude "Extrusion14" add sketch "Sketch1" along normal blind 11.4 contours A4
sketch "Sketch2" plane through (0, 11.4, 45) normal (0, 1, 0) x (1, 0, 0)
  point P0 (0, 45)
  point P1 (0, 0)
hole "Hole3" at (0, 11.4, 45) direction (0, -1, 0) diameter 4.2 end through all
fillet "Fillet10" radius 2 2 edges at (-6.8, 2, 32.8) (17.8, 2, 32.8)
fillet "Fillet10" radius 1 2 edges at (19.8, 2, 57.2) (-8.8, 2, 57.2)
fillet "Fillet11" radius 0.5 11 edges at (19.6194, 4, 56.9798) (20.0778, 4, 55.6377) (-8.6194, 4, 56.9798) (-9.084, 4, 55.4955) (5.5, 4, 57.2) (5.5973, 4, 32.8) (4.25, 11.4, 45) (19.0223, 4, 44.7239) (17.3347, 4, 33.3154) (-6.2142, 4, 33.3858) (-7.9116, 4, 47.6848)
sketch "Sketch4" plane through (0, 4, 0) normal (0, 1, 0) x (1, 0, 0)
  point P0 (0, 0)
  point P1 (-3.5, -54.2)
  point P2 (14.5, -54.2)
  point P3 (14.5, -35.8)
  point P4 (-3.5, -35.8)
hole "Hole4" at (-3.5, 4, 54.2) at (-3.5, 4, 35.8) at (14.5, 4, 35.8) at (14.5, 4, 54.2) direction (0, -1, 0) diameter 2.3 depth 6.5 countersink diameter 4.5 countersink angle 90
hole "Hole5" at (0, 0, 45) direction (0, 1, 0) diameter 5.6 depth 6.5 counterbore diameter 9 counterbore depth 1
properties part number "LegPin_Side_fillet_v1"
